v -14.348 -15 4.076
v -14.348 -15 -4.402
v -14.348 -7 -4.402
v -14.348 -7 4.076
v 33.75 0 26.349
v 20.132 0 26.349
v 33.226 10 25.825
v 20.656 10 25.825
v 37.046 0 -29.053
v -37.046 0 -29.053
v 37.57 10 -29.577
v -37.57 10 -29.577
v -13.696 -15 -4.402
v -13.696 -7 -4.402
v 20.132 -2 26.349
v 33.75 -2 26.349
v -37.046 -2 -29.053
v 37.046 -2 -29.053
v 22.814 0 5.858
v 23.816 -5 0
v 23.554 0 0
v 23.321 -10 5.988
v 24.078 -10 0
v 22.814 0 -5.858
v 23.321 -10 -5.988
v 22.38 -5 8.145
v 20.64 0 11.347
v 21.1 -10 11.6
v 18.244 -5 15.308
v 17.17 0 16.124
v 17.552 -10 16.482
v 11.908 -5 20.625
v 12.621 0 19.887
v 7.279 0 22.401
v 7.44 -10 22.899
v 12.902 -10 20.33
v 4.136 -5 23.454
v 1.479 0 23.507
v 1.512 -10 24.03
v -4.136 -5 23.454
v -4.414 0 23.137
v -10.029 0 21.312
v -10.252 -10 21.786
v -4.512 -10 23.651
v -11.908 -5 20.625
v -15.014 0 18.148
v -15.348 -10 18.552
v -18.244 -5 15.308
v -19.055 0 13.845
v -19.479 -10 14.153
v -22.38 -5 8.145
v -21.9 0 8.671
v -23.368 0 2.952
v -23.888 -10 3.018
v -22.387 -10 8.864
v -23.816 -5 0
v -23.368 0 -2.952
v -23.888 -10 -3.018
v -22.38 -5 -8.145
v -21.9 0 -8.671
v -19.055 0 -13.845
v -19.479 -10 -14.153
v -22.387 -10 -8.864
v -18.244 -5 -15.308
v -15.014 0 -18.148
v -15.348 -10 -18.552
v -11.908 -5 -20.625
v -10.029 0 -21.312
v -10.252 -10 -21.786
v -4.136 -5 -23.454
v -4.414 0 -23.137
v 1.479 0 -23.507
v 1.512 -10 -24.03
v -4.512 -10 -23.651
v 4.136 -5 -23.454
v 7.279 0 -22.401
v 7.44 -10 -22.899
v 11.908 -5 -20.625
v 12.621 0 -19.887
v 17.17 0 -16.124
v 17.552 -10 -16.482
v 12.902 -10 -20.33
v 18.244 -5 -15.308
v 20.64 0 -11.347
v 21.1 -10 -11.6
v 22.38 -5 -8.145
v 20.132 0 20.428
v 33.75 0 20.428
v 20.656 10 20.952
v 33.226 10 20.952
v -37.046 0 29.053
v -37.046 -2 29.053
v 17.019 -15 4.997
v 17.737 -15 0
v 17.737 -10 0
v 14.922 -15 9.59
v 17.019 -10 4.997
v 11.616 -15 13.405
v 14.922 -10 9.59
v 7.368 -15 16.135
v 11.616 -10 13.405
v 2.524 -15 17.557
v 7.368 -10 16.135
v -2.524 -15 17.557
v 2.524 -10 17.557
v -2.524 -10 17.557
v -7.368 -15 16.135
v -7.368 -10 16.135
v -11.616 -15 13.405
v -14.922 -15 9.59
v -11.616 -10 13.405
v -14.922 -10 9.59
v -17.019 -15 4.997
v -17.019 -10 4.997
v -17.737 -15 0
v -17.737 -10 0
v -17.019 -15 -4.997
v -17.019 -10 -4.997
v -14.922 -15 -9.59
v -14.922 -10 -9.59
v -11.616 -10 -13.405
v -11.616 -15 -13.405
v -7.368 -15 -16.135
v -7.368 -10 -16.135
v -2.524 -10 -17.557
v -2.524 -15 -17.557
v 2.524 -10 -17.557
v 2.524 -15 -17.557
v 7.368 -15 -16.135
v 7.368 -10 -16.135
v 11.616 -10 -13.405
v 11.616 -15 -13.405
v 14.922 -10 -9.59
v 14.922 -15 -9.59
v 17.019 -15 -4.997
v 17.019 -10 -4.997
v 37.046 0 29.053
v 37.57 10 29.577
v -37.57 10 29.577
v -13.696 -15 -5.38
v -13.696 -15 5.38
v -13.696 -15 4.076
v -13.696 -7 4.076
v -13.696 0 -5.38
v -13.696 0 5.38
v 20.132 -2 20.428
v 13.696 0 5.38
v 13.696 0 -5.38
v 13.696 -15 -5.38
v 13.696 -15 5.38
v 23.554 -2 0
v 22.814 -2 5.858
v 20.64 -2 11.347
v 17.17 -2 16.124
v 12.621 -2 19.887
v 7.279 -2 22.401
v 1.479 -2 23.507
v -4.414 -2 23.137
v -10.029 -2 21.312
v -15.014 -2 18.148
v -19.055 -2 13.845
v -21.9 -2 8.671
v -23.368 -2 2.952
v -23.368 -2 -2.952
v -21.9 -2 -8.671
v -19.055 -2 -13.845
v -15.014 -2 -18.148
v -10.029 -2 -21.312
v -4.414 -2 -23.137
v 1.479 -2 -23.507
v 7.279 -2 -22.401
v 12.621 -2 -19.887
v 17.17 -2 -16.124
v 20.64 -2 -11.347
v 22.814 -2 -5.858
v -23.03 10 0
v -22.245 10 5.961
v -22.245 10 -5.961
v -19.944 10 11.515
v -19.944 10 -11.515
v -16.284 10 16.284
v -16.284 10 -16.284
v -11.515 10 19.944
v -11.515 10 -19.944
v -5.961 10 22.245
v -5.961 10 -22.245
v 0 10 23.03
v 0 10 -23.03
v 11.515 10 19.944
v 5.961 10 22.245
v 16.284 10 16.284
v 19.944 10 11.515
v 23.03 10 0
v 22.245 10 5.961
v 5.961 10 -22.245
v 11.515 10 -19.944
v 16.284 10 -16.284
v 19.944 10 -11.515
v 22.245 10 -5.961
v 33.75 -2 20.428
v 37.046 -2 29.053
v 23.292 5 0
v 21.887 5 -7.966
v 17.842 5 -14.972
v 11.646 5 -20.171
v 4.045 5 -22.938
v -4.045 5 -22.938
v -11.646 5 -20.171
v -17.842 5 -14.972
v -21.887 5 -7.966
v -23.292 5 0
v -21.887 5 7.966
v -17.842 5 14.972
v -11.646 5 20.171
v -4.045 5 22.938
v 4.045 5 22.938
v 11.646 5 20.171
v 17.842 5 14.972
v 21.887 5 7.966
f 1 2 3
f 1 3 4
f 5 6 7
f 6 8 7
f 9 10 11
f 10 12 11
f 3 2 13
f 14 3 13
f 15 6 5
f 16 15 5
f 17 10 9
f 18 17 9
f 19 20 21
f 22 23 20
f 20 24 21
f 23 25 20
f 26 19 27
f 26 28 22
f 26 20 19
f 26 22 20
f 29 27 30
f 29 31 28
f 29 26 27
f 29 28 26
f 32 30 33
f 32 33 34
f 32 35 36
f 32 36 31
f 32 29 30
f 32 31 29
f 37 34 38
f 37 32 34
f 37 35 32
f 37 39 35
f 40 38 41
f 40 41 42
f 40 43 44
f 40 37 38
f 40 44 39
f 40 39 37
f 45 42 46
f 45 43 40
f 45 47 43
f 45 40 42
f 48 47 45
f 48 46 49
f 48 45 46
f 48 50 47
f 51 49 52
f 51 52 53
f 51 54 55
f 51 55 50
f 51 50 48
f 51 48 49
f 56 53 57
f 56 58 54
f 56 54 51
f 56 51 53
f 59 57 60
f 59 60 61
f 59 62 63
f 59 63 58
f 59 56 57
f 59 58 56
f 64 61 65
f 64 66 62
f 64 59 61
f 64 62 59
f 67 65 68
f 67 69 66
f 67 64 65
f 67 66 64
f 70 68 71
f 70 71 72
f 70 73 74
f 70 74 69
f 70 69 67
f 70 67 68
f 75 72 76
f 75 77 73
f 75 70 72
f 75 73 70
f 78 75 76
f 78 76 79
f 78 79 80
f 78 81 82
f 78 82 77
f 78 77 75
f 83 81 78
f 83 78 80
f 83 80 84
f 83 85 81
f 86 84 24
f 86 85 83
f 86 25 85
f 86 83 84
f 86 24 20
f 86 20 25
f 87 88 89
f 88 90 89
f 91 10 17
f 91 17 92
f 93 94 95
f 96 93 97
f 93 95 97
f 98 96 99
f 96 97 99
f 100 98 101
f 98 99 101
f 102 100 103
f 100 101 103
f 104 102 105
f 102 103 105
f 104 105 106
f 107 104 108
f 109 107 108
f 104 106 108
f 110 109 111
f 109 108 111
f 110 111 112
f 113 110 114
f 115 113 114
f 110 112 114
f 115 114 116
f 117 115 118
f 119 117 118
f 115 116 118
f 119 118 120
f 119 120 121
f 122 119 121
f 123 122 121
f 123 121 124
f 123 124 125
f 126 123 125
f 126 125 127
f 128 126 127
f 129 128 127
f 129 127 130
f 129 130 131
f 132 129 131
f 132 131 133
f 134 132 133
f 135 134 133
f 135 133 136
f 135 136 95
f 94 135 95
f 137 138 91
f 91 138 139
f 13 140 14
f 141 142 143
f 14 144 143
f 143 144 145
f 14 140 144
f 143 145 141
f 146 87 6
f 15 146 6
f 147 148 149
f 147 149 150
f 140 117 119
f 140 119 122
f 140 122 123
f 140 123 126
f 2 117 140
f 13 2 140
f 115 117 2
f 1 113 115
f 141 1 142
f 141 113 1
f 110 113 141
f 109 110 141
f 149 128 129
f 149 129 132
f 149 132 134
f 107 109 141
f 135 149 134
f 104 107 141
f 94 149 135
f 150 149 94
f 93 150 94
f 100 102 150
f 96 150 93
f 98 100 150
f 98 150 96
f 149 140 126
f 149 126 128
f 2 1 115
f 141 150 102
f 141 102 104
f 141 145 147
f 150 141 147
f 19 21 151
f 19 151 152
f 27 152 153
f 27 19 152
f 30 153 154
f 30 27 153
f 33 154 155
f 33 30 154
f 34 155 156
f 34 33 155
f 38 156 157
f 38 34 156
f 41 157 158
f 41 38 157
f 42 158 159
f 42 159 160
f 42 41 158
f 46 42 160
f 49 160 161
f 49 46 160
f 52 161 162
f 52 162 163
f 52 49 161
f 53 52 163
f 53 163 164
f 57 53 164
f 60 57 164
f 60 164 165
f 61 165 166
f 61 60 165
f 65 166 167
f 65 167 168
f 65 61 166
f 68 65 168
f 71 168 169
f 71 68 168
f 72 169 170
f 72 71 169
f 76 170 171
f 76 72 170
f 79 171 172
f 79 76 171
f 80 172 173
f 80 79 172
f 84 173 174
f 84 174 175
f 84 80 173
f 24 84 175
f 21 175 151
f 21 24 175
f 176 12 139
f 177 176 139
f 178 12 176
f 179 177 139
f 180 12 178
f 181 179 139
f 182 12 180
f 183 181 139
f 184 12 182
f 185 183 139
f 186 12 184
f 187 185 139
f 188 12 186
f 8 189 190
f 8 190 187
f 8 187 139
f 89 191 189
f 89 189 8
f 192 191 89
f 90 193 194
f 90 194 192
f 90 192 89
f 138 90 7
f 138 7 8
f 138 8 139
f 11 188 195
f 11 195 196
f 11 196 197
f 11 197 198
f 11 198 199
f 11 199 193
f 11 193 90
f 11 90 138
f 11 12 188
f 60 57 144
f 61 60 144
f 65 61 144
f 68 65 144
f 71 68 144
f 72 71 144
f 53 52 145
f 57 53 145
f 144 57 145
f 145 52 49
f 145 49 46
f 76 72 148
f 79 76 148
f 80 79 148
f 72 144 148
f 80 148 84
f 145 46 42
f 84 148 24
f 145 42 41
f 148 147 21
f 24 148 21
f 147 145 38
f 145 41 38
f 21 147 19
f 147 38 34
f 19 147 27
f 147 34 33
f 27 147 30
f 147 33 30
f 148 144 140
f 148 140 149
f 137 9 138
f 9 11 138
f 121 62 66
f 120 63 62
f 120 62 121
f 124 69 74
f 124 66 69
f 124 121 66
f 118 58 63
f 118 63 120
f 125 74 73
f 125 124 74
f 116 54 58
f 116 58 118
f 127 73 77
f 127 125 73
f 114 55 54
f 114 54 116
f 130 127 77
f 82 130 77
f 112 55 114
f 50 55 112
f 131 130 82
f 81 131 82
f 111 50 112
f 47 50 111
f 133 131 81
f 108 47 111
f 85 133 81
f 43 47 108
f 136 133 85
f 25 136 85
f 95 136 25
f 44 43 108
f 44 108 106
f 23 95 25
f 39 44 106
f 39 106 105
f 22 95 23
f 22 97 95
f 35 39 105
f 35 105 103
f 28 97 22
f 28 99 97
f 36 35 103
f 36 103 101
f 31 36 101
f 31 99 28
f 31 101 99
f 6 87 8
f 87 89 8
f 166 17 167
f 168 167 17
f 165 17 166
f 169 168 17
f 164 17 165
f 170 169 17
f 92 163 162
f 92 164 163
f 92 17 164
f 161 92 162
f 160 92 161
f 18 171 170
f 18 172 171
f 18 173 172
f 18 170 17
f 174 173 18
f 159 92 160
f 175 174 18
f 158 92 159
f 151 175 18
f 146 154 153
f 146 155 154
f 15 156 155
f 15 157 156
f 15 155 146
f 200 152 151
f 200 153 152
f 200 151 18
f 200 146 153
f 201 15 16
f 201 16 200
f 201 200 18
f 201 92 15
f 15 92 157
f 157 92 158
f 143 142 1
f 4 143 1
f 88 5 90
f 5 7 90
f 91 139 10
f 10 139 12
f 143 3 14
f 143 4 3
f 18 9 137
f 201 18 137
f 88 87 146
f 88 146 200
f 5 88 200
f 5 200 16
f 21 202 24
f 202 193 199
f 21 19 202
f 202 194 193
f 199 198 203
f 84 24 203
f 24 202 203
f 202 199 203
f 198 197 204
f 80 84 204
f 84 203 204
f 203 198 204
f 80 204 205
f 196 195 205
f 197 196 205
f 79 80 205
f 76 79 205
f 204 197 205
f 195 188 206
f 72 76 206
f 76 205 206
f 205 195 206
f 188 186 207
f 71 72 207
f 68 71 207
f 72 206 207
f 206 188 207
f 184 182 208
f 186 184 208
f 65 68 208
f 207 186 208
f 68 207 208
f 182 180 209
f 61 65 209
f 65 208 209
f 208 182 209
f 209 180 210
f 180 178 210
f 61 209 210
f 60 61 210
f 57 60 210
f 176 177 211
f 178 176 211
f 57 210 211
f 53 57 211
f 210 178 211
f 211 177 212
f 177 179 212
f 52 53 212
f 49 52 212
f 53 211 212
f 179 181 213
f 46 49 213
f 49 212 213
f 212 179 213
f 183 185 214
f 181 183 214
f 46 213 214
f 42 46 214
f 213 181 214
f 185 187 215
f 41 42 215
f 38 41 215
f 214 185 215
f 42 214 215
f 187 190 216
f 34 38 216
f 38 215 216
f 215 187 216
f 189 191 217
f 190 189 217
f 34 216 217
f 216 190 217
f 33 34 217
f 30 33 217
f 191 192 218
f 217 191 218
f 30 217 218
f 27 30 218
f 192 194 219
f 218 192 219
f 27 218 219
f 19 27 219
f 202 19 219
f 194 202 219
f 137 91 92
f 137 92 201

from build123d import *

# Parameters (mm, degrees)
F0_W          = 74.0917101502
F0_H          = 58.1057071686
F0_R          = 23.5537470602
F0_W_2        = 13.6184170842
F0_H_2        = 5.9210546315
F1_DEPTH      = 10
F1_TAPER      = -3
F1_DEPTH_BACK = 2
F0_R_2        = 17.7374506233
F2_DEPTH      = 10
F2_TAPER      = -3
F0_W_3        = 27.3913051933
F0_H_3        = 10.7608698308
F3_DEPTH      = 15
F4_W          = 26.7391316593
F4_H          = 8.4782613267
F4_W_2        = 0.6521801697
F5_DEPTH      = 8


with BuildPart() as f1:
    # F0 (on Front) → F1 (new body, two sides)
    with BuildSketch(Plane.XZ) as f1_sk:
        Rectangle(F0_W, F0_H)
        Circle(F0_R, mode=Mode.SUBTRACT)
        with Locations((26.940792799, 23.38815853)):
            Rectangle(F0_W_2, F0_H_2, mode=Mode.SUBTRACT)
    extrude(amount=-F1_DEPTH, taper=F1_TAPER)
    extrude(f1_sk.sketch, amount=F1_DEPTH_BACK)


with BuildPart() as f2:
    # F0 (on Front) → F2 (new body)
    with BuildSketch(Plane.XZ):
        Circle(F0_R)
        Circle(F0_R_2, mode=Mode.SUBTRACT)
    extrude(amount=F2_DEPTH, taper=F2_TAPER)

    # F0 (on Front) → F3 (join)
    with BuildSketch(Plane.XZ):
        Circle(F0_R_2)
        Rectangle(F0_W_3, F0_H_3, mode=Mode.SUBTRACT)
    extrude(amount=F3_DEPTH)

    # F4 (on face) → F5 (cut)
    with BuildSketch(Plane.XZ.offset(15)):
        with Locations((-0.326086767, -0.1630434854)):
            Rectangle(F4_W, F4_H)
        with Locations((-14.0217426815, -0.1630434854)):
            Rectangle(F4_W_2, F4_H)
    extrude(amount=-F5_DEPTH, mode=Mode.SUBTRACT)


solid = Compound([f1.part, f2.part])
